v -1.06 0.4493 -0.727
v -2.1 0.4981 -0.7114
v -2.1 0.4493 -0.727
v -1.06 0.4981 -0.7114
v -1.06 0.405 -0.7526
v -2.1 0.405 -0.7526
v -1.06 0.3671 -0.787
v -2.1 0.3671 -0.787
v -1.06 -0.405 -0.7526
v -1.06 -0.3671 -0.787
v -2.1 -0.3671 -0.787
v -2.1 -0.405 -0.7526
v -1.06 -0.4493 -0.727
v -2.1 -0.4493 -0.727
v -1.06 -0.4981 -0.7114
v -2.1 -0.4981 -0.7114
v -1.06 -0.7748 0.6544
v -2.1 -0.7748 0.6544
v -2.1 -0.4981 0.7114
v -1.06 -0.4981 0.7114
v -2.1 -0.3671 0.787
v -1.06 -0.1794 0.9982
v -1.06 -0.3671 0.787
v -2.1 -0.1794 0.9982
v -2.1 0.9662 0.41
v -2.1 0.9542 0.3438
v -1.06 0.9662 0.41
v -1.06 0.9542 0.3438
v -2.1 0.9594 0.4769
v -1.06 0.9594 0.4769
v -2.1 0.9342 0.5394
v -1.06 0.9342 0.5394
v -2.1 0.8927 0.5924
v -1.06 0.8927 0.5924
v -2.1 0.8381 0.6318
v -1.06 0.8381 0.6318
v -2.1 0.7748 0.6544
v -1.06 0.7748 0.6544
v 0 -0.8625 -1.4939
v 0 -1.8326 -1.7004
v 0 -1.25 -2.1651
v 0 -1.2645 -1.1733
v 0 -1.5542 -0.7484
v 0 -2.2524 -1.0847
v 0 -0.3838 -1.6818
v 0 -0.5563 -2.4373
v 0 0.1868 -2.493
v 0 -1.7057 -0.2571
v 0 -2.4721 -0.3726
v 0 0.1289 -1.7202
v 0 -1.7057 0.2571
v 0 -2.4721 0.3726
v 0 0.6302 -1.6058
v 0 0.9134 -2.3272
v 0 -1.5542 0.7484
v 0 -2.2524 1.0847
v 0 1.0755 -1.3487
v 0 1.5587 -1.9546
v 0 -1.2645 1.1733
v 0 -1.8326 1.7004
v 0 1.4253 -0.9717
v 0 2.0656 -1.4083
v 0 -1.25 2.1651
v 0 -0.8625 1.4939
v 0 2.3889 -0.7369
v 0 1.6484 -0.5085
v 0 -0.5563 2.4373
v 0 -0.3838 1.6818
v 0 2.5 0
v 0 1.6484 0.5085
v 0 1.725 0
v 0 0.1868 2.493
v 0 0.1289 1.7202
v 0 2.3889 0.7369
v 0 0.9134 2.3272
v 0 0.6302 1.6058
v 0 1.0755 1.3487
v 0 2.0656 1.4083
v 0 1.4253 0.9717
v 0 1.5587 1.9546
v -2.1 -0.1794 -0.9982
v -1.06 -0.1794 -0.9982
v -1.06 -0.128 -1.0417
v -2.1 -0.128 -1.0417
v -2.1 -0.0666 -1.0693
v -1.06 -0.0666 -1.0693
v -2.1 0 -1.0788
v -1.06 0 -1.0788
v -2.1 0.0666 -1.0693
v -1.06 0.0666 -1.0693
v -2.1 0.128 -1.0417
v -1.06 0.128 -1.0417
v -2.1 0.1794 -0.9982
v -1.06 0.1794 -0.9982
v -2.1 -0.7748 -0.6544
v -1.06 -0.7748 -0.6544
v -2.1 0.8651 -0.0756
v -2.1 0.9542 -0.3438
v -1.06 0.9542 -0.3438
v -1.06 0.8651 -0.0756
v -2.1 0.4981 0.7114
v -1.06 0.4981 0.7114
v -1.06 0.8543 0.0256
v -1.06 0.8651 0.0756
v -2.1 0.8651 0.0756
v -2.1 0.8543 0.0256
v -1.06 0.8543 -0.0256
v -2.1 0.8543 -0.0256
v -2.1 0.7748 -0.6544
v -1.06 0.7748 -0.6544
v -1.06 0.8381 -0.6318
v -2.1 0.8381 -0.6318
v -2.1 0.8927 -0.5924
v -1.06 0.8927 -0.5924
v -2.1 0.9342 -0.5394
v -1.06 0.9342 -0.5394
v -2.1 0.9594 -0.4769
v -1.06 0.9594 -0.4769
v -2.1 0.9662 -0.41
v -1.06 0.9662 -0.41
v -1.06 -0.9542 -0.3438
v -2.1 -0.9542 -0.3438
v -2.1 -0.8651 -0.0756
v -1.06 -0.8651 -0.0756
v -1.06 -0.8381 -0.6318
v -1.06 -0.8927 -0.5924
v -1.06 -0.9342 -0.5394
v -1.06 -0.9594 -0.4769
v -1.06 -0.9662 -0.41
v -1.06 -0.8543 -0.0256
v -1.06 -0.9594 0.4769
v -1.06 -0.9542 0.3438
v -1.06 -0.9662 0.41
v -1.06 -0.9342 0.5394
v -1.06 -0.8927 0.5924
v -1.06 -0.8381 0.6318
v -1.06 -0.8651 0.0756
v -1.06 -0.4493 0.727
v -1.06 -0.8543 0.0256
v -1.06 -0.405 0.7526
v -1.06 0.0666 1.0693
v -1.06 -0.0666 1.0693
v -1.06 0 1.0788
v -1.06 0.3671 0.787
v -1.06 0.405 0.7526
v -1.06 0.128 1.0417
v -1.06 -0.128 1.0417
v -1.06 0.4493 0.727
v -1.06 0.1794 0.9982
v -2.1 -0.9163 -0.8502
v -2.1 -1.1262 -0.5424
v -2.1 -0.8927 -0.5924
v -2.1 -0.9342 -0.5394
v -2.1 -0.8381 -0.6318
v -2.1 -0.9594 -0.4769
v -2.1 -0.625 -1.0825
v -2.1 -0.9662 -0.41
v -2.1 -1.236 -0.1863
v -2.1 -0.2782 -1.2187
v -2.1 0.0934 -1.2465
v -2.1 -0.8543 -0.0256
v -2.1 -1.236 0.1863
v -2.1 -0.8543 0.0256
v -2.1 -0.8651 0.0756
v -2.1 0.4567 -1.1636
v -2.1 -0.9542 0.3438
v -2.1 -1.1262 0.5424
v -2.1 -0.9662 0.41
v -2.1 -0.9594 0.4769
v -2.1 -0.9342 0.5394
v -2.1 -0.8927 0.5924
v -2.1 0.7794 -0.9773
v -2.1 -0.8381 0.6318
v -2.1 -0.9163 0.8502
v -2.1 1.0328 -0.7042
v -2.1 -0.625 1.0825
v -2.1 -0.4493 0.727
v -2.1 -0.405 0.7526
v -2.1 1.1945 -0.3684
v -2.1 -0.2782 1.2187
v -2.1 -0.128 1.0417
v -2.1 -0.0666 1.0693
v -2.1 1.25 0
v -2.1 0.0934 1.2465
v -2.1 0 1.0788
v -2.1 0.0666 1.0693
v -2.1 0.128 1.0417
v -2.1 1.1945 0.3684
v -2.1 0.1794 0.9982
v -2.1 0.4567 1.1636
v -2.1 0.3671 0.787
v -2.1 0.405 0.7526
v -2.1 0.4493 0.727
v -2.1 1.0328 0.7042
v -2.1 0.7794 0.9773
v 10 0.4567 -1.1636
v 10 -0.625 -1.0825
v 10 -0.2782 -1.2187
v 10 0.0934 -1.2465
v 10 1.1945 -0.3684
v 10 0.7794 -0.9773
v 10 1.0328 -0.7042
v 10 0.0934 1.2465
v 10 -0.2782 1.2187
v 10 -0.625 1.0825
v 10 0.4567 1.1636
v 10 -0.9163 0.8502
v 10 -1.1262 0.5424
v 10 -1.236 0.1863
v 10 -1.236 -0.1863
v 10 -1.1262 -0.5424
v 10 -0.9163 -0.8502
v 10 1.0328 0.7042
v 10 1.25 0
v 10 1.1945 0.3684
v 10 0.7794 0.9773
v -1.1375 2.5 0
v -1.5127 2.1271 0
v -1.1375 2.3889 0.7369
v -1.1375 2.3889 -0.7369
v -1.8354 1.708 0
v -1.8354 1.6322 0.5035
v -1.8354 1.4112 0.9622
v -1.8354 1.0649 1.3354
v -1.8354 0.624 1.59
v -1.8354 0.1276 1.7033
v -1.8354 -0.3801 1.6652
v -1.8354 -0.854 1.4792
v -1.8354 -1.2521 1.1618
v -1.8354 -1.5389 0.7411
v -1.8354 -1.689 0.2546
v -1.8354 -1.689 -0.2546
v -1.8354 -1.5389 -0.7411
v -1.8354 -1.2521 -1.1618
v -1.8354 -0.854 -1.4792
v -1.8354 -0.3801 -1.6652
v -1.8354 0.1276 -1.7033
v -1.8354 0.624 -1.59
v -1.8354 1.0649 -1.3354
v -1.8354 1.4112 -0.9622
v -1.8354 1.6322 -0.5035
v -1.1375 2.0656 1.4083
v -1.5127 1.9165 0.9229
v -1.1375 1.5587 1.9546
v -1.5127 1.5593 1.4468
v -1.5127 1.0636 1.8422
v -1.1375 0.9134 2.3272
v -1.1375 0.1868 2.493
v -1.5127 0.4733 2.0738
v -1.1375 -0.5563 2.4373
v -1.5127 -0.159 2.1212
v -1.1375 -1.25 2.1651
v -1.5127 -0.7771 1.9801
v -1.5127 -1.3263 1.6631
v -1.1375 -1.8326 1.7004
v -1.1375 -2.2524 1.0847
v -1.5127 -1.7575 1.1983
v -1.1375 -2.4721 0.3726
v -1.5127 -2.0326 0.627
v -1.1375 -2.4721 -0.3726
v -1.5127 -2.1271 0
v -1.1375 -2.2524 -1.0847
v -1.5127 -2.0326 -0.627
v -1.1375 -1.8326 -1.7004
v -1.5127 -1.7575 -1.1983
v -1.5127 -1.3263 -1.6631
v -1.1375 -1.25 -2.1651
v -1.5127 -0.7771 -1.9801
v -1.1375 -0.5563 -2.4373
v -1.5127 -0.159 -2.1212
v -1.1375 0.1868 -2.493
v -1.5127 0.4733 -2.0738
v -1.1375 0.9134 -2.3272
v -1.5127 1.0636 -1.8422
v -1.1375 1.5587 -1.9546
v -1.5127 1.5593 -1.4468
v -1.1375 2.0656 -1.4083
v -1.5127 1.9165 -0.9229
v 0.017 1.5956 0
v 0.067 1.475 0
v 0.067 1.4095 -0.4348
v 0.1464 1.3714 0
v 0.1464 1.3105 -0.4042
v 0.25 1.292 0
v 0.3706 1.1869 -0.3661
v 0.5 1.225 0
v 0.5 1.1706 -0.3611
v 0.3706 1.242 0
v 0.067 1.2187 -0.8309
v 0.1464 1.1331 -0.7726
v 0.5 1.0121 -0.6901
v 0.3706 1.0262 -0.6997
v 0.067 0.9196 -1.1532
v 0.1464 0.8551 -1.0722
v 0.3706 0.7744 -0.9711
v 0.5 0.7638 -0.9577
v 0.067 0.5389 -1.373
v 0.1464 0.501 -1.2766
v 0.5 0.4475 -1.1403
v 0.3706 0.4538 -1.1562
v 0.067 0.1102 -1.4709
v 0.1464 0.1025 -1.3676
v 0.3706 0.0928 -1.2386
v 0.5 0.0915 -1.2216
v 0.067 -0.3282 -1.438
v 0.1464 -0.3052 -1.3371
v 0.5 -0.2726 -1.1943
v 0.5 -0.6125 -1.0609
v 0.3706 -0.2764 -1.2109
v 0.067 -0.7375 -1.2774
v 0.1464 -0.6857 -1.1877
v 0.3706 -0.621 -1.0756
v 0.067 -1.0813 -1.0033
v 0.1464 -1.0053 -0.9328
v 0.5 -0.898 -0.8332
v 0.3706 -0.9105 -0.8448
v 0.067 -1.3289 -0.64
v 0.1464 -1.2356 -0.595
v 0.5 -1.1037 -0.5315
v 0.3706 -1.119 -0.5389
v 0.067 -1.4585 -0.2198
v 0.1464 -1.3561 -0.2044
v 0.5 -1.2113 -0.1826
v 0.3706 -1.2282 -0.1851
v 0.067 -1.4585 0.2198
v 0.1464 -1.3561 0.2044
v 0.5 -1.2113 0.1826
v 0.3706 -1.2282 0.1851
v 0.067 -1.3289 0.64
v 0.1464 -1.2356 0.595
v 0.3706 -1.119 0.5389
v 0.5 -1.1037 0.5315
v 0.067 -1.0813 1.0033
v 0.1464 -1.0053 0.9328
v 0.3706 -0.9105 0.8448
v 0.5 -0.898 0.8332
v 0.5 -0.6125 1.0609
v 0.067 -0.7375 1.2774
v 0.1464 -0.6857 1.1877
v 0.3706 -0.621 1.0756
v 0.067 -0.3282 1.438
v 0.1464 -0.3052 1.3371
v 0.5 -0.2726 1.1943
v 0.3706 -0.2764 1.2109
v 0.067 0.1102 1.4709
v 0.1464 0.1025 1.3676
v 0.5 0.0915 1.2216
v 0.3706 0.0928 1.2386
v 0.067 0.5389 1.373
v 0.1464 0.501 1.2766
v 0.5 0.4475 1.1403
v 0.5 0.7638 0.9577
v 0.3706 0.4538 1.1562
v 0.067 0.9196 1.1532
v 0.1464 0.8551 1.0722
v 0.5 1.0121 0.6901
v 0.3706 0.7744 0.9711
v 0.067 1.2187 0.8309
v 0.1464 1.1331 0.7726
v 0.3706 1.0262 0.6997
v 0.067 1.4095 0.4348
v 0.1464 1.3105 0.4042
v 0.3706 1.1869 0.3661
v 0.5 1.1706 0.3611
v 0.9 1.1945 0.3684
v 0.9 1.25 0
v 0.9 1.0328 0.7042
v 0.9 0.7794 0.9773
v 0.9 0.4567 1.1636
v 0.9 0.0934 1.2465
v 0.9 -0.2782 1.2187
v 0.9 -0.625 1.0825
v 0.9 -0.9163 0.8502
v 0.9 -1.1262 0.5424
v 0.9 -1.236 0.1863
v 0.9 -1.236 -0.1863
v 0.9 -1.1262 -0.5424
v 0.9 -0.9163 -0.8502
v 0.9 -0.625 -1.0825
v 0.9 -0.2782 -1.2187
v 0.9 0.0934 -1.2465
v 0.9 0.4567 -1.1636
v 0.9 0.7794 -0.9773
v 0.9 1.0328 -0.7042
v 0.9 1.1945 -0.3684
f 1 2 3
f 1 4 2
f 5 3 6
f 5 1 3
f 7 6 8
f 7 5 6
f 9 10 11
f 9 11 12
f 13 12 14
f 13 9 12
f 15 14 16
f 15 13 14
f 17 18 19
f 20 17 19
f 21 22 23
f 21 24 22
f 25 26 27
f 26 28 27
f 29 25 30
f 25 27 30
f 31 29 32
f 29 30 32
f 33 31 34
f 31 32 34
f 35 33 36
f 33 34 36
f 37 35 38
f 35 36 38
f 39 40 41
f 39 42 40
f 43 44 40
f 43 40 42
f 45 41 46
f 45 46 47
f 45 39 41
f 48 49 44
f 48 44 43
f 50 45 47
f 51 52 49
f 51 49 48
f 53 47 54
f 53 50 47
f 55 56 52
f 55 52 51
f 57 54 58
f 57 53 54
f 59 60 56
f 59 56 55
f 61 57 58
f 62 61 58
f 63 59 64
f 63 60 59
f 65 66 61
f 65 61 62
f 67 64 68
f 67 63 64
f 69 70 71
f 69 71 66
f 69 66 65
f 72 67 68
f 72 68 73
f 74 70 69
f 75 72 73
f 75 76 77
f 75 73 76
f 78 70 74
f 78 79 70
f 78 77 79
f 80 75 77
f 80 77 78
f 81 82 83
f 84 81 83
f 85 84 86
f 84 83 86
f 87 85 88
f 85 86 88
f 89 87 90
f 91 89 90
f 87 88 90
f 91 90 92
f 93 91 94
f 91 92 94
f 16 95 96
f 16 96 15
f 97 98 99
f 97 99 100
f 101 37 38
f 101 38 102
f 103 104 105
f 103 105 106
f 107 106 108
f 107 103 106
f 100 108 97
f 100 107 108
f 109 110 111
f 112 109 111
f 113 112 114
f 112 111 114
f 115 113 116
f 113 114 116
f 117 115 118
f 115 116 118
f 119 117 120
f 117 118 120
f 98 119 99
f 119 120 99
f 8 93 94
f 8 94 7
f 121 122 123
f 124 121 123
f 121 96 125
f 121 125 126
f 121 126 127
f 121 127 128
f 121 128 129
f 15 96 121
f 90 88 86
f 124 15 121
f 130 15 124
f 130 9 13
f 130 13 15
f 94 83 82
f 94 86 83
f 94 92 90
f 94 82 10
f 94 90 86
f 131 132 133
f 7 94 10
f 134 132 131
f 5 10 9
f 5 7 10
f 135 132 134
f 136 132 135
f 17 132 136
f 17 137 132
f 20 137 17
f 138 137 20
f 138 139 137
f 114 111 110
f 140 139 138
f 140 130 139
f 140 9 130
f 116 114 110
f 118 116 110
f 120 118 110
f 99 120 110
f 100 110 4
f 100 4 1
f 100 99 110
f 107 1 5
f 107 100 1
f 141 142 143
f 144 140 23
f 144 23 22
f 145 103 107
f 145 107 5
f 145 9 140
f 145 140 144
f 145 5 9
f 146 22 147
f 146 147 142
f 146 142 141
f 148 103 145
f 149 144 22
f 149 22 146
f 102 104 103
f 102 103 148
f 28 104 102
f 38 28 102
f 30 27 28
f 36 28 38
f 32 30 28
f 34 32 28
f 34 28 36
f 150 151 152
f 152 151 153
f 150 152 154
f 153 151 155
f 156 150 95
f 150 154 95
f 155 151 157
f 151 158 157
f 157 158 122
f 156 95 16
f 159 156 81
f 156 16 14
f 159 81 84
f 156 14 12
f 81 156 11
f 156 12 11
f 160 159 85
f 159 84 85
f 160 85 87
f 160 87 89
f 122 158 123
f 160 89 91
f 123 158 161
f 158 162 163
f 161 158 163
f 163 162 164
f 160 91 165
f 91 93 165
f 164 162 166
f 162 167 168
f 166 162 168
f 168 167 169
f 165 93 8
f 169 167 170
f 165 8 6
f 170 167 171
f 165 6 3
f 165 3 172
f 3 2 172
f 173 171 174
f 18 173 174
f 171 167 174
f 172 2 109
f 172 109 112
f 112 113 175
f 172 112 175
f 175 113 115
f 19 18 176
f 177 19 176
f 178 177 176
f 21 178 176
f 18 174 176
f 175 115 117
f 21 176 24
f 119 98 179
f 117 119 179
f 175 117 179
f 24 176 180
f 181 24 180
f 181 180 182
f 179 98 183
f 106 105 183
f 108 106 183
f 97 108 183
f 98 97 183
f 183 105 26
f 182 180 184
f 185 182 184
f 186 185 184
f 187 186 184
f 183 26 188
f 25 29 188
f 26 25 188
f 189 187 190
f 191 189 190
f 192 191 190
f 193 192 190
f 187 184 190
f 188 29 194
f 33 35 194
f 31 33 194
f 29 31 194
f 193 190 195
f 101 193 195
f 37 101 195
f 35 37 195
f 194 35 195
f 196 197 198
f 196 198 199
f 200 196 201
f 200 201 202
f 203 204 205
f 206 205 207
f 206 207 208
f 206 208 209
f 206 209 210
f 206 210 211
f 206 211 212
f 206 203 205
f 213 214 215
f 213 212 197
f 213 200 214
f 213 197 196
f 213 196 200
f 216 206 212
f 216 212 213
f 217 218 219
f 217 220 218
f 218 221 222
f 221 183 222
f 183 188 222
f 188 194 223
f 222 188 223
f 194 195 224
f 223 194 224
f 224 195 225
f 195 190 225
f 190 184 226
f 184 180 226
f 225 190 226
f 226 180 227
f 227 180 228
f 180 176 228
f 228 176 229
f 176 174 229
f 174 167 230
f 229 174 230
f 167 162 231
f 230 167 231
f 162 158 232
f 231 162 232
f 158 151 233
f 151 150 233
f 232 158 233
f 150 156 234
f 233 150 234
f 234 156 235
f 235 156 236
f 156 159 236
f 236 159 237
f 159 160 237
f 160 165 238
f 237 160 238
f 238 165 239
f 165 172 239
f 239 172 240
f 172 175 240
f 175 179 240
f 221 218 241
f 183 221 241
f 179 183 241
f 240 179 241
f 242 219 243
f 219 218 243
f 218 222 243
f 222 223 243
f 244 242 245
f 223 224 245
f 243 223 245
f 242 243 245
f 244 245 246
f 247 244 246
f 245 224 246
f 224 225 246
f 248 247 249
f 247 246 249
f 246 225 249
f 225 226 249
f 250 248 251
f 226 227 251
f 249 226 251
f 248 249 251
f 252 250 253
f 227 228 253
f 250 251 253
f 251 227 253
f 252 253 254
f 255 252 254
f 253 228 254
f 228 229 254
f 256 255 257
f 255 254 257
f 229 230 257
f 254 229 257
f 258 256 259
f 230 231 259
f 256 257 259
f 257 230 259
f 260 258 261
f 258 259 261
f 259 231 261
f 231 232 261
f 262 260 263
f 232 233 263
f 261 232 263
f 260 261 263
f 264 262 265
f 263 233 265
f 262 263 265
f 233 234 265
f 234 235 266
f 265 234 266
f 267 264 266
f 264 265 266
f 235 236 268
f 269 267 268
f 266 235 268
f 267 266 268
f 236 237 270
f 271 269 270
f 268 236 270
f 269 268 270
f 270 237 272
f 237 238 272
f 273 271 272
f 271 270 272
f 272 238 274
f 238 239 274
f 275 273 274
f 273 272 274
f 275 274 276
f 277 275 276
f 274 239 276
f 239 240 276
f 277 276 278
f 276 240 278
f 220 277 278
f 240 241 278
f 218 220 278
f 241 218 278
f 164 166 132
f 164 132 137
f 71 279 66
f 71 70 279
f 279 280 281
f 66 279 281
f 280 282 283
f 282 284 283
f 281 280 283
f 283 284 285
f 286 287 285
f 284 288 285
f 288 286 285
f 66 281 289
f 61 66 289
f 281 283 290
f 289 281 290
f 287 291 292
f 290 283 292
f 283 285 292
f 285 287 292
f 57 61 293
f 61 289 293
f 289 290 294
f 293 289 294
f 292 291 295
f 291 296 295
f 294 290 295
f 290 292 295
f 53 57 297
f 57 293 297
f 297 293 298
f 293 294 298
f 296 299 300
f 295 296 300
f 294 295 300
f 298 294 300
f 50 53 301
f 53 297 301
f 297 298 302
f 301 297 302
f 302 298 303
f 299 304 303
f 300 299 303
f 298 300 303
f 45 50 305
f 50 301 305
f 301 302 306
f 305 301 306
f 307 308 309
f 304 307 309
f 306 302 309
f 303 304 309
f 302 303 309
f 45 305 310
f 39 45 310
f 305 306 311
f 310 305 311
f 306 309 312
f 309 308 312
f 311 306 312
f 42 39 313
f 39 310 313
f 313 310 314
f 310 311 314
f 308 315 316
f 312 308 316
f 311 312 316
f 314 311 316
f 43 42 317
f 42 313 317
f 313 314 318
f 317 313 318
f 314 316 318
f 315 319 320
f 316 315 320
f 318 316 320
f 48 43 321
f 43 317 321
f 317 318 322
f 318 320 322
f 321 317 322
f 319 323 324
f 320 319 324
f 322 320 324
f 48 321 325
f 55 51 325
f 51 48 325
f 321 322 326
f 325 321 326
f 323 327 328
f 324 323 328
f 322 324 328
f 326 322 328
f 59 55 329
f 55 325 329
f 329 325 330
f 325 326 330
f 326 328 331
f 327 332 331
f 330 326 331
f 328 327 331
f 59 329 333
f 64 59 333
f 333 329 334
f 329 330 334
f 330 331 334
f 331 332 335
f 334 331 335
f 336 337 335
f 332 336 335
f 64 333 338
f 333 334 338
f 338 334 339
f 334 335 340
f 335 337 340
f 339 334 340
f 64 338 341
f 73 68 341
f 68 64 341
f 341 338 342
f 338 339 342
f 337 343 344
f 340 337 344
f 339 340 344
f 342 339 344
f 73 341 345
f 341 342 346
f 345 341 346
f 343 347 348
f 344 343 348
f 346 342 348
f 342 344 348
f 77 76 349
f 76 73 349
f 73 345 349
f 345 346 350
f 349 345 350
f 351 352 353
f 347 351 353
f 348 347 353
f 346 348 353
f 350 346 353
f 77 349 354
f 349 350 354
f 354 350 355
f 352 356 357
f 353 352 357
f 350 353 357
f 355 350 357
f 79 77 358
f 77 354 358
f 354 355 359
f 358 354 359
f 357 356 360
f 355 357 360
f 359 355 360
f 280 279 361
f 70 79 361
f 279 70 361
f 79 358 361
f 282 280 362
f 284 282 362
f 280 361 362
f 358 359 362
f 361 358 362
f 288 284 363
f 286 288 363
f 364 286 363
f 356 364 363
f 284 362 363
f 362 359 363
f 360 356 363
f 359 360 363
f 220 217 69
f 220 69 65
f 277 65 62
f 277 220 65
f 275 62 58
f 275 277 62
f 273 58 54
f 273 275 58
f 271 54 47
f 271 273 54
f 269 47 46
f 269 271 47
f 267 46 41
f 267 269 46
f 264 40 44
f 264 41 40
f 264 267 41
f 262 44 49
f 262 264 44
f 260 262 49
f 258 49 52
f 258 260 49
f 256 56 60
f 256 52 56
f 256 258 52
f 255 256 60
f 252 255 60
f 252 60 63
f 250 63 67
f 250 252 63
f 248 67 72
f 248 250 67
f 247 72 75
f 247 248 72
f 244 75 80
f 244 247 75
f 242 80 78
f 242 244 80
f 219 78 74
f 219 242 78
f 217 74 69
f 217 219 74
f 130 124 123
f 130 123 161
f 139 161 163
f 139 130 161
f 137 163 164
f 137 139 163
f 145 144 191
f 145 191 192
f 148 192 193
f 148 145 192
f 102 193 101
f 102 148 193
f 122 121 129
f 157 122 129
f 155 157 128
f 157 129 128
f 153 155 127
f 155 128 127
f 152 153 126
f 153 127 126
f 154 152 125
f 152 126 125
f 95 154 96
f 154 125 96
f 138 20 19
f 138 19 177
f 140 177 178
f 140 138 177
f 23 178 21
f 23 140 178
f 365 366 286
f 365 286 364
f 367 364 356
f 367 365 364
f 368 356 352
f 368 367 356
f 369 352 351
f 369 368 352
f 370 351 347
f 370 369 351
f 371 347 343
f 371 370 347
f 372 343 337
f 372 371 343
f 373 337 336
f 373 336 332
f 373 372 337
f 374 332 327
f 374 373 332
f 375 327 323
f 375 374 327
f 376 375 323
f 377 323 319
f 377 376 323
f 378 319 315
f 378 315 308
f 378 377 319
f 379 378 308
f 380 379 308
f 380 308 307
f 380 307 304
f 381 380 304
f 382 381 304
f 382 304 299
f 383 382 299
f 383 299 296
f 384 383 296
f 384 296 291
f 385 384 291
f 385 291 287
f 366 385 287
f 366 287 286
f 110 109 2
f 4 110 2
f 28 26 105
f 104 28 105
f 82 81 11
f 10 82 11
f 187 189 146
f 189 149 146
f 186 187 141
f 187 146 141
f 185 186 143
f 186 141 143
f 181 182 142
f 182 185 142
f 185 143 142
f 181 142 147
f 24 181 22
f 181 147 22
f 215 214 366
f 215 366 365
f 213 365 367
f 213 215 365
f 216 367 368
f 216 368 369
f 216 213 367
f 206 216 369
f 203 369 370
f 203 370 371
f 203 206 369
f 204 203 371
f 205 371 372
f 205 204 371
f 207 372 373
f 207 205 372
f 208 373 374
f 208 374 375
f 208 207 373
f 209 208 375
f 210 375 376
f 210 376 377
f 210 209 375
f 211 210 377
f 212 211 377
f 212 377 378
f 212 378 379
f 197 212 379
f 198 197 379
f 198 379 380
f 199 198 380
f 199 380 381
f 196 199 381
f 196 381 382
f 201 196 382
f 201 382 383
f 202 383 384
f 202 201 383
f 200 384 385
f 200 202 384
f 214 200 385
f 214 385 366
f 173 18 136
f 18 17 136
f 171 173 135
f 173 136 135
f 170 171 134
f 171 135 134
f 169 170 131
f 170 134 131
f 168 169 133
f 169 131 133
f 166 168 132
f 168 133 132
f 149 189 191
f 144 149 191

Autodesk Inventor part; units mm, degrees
ref_plane "YZ Plane" through (0, 0, 0) normal (1, 0, 0) x (0, 1, 0)
ref_plane "XZ Plane" through (0, 0, 0) normal (0, 1, 0) x (-1, 0, 0)
ref_plane "XY Plane" through (0, 0, 0) normal (0, 0, 1) x (1, 0, 0)
sketch "Sketch4" plane through (0, 0, 0) normal (0, 0, 1) x (1, 0, 0)
  line L0 (-2.1, 0) -> (10, 0)
  line L1 (0, 0) -> (-2.1, 0)
  line L2 (0, 2.5) -> (0, 1.725)
  line L3 (0.5, 1.225) -> (0.5, 1.225)
  line L4 (0.5, 1.225) -> (0.9, 1.25)
  arc A0 (0, 1.725) -> (0.5, 1.225) centre (0.5, 1.725) ccw
  line L5 (-2.1, 0) -> (-2.1, 1.25)
  line L6 (0, 2.5) -> (-1.1375, 2.5)
  arc A1 (-1.1375, 2.5) -> (-2.1, 1.25) centre (1.4883, -0.5175) ccw
  line L7 (0.9, 1.25) -> (10, 1.25)
  line L8 (10, 1.25) -> (10, 0)
  point P0 (0, 1.225)
  dimension "d71" = 0.5
  dimension "d72" = 10
  dimension "d74" = 0.4
  dimension "d75" = 2.45
  dimension "d78" = 2.5
  dimension "d82" = 4
  dimension "d83" = 2.1
  dimension "d84" = 5
  dimension "d104" = 9.1
  dimension "d105" = 2.5
revolve "Revolution7" add sketch "Sketch4" angle 360 about axis through (-2.1, 0, 0) along (1, 0, 0)
sketch "Sketch5" plane through (-2.1, 0, 0) normal (-1, 0, 0) x (0, 0, 1)
  circle A0 centre (0, 0) radius 1.2 construction
  circle A1 centre (0, 0) radius 0.84 construction
  line L0 (0, 0) -> (-0.7275, 0.42)
  line L1 (0, 0) -> (-0.7275, -0.42)
  line L2 (-1.8008, 0) -> (1.7887, 0)
  line L3 (-1.2, 0) -> (-0.7275, -0.42)
  line L4 (-1.2, 0) -> (-0.7275, 0.42)
  dimension "d88" = 2.4
  dimension "d89" = 1.68
  dimension "d90" = 30
  dimension "d91" = 30
extrude "Extrusion1" cut sketch "Sketch5" against normal blind 1.04
pattern_circular "Circular Pattern1" count 6 over 360 about axis through (-10, 0, 0) along (1, 0, 0) of "Extrusion1"
fillet "Fillet1" radius 0.24 12 edges at (-1.58, -1.0392, -0.6) (-1.58, -0.42, -0.7275) (-1.58, -0.84, 0) (-1.58, -1.0392, 0.6) (-1.58, -0.42, 0.7275) (-1.58, 0, 1.2) (-1.58, 0.84, 0) (-1.58, 1.0392, 0.6) (-1.58, 0.42, 0.7275) (-1.58, 0.42, -0.7275) (-1.58, 0, -1.2) (-1.58, 1.0392, -0.6)
thread "Thread7" size "M2.5x0.45" class "6g" standard "ISO Metric profile" length 9.1
properties part number "Flachkopfschraube mit Innenrund ISO 14583 - M2,5 x 10 - 4.8" material "Steel"
